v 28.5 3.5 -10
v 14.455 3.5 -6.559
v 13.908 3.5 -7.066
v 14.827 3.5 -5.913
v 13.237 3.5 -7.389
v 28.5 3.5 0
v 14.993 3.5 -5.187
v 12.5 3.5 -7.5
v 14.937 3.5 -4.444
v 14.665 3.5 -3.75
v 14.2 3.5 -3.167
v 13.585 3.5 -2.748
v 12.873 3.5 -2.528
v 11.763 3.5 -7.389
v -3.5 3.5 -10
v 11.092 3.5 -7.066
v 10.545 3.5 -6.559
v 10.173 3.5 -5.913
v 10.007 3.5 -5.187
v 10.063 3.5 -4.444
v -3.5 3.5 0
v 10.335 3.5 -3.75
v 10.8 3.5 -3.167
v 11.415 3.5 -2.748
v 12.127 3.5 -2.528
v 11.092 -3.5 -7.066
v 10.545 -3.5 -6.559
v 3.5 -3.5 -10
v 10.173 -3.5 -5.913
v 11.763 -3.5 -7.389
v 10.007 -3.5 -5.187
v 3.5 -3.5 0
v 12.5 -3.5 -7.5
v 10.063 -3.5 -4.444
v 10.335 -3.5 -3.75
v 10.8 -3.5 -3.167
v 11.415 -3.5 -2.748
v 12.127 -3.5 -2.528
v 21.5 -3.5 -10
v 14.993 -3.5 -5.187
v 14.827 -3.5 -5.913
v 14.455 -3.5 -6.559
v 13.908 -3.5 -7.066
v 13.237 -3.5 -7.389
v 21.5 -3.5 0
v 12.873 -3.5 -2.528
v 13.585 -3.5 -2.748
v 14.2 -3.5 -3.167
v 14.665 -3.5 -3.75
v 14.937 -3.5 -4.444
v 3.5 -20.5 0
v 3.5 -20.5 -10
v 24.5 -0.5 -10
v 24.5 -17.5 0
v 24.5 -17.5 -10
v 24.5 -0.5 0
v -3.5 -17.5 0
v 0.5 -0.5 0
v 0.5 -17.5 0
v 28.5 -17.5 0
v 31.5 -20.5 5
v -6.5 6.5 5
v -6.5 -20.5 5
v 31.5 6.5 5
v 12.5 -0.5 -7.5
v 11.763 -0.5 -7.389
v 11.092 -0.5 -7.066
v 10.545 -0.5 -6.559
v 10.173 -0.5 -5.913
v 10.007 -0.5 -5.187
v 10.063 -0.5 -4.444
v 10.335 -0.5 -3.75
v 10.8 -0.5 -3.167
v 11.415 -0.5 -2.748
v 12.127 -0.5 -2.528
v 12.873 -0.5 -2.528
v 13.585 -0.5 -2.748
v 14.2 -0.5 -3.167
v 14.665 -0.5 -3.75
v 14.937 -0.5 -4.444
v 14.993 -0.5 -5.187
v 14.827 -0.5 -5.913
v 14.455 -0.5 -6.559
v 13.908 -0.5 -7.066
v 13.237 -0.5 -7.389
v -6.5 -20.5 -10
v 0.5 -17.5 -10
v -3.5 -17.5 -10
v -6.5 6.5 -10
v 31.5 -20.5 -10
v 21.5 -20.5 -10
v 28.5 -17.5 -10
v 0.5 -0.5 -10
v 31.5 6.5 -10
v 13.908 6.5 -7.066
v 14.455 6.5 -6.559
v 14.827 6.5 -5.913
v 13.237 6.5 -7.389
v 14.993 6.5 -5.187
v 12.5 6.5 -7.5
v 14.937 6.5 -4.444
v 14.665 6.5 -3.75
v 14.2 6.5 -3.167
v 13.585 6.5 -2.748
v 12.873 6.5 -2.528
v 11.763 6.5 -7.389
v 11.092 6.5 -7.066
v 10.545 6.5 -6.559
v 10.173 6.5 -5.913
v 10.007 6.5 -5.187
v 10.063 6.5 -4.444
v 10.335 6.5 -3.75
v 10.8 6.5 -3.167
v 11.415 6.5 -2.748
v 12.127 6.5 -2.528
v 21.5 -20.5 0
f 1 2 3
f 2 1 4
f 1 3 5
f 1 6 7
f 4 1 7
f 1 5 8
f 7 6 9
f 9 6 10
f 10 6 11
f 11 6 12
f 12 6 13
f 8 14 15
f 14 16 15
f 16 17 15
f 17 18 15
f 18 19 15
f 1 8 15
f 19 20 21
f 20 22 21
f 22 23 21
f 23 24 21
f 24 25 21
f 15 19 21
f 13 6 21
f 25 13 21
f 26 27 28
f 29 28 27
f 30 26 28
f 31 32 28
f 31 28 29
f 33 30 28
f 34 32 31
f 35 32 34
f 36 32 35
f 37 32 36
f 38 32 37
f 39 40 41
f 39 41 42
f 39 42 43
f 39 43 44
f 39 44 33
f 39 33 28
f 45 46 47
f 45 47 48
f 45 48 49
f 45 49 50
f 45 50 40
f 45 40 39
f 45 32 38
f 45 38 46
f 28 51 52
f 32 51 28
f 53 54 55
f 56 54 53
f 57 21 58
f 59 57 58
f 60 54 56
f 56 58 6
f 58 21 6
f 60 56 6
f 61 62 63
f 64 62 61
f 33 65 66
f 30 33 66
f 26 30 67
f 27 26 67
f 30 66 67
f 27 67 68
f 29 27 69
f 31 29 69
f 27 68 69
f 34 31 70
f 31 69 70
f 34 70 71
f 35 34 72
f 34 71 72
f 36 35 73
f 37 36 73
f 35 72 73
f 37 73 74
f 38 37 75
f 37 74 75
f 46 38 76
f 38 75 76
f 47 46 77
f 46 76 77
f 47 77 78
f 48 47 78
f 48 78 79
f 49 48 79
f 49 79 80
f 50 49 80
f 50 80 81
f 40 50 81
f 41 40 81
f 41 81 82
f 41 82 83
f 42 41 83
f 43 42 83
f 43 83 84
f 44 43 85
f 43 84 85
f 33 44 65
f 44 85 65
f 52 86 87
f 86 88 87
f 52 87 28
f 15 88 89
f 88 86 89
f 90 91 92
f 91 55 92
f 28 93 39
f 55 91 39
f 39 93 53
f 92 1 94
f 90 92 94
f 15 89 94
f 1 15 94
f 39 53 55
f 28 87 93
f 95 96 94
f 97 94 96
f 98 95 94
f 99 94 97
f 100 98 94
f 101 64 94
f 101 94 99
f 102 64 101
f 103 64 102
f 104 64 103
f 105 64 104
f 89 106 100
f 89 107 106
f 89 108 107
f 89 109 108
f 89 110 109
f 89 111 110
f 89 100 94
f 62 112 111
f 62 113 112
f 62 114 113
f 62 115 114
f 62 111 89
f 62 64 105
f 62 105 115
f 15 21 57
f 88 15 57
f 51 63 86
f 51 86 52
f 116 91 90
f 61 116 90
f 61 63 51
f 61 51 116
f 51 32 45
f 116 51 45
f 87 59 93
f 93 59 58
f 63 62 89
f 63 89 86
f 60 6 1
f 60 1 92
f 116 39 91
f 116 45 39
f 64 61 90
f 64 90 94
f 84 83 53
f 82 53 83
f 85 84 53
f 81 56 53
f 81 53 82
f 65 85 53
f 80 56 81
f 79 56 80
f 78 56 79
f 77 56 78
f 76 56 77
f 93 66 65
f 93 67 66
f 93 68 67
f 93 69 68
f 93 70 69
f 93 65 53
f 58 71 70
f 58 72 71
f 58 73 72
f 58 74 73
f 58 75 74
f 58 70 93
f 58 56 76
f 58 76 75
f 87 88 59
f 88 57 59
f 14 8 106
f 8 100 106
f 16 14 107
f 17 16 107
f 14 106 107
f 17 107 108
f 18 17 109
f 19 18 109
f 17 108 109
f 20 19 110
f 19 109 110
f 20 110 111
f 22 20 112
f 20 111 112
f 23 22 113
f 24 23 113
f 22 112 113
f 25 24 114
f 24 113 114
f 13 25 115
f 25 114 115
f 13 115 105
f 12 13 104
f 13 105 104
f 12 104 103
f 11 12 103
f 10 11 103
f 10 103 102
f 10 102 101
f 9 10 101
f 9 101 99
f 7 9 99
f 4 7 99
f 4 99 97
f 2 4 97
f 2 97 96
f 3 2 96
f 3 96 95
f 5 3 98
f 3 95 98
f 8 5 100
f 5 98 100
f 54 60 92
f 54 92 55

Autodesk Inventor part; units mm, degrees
ref_plane "YZ Plane" through (0, 0, 0) normal (1, 0, 0) x (0, 1, 0)
ref_plane "XZ Plane" through (0, 0, 0) normal (0, 1, 0) x (-1, 0, 0)
ref_plane "XY Plane" through (0, 0, 0) normal (0, 0, 1) x (1, 0, 0)
sketch "Sketch1" plane through (0, 0, 0) normal (0, 0, 1) x (1, 0, 0)
  line L0 (0, 0) -> (0, 3)
  line L1 (0, 3) -> (25, 3)
  line L2 (25, 3) -> (25, 0)
  line L3 (25, 0) -> (0, 0)
  line L4 (0.5, 3.5) -> (24.5, 3.5)
  line L5 (25, 3) -> (28, 3)
  line L6 (28, 3) -> (28, -17)
  line L7 (28, -17) -> (25, -17)
  line L8 (25, -17) -> (25, 3)
  line L9 (24.5, 3.5) -> (28.5, 3.5)
  line L10 (28.5, 3.5) -> (28.5, -17.5)
  line L11 (28.5, -17.5) -> (24.5, -17.5)
  line L12 (24.5, -17.5) -> (24.5, -0.5)
  line L13 (-3, 3) -> (0, 3)
  line L14 (0, 3) -> (0, -17)
  line L15 (0, -17) -> (-3, -17)
  line L16 (-3, -17) -> (-3, 3)
  line L17 (0.5, 3.5) -> (-3.5, 3.5)
  line L18 (-3.5, 3.5) -> (-3.5, -17.5)
  line L19 (-3.5, -17.5) -> (0.5, -17.5)
  line L20 (24.5, -0.5) -> (0.5, -0.5)
  line L21 (0.5, -17.5) -> (0.5, -0.5)
  line L22 (12.5, 0) -> (12.5, -5.0944) construction
  line L23 (21.5, -3.5) -> (21.5, -20.5)
  line L24 (21.5, -20.5) -> (31.5, -20.5)
  line L25 (31.5, -20.5) -> (31.5, 6.5)
  line L26 (31.5, 6.5) -> (24.5, 6.5)
  line L27 (24.5, 6.5) -> (0.5, 6.5)
  line L28 (0.5, 6.5) -> (-6.5, 6.5)
  line L29 (-6.5, 6.5) -> (-6.5, -20.5)
  line L30 (-6.5, -20.5) -> (3.5, -20.5)
  line L31 (3.5, -20.5) -> (3.5, -3.5)
  line L32 (3.5, -3.5) -> (21.5, -3.5)
  line L33 (21.5, -20.5) -> (3.5, -20.5)
  dimension "d1" = 0.5
  dimension "d3" = 0.5
  dimension "d4" = 0.5
  dimension "d5" = 3
extrude "Extrusion1" add sketch "Sketch1" against normal blind 10 contours L32 L31 L30 L29 L28 L27 L26 L25 L24 L23
extrude "Extrusion2" add sketch "Sketch1" along normal blind 5 contours L14 L15 L16 L13 L0 | L0 L1 L2 L3 | L2 L5 L6 L7 L8 | L4 L9 L10 L11 L12 L20 L21 L19 L18 L17 | L32 L31 L30 L29 L28 L27 L26 L25 L24 L23 | L23 L33 L31 L32
sketch "Sketch2" plane through (3.5, -3.5, -10) normal (0, -1, 0) x (1, 0, 0)
  line L0 (0, 0) -> (-10, 0) projected
  line L1 (18, 10) -> (18, 0) projected
  line L2 (0, 0) -> (18, 0) construction
  line L3 (18, 0) -> (18, 10)
  line L4 (18, 10) -> (0, 10) construction
  line L5 (0, 10) -> (0, 0) construction
  point P0 (-3.5, 10)
  point P1 (18, 15)
  point P2 (9, 5)
  dimension "d10" = 5
  dimension "d11" = 9
  dimension "d12" = 10
hole "Hole1" at (12.5, -3.5, -5) direction (0, 1, 0) diameter 5 depth 300 tip angle 118
properties part number "Toper_Carril"
